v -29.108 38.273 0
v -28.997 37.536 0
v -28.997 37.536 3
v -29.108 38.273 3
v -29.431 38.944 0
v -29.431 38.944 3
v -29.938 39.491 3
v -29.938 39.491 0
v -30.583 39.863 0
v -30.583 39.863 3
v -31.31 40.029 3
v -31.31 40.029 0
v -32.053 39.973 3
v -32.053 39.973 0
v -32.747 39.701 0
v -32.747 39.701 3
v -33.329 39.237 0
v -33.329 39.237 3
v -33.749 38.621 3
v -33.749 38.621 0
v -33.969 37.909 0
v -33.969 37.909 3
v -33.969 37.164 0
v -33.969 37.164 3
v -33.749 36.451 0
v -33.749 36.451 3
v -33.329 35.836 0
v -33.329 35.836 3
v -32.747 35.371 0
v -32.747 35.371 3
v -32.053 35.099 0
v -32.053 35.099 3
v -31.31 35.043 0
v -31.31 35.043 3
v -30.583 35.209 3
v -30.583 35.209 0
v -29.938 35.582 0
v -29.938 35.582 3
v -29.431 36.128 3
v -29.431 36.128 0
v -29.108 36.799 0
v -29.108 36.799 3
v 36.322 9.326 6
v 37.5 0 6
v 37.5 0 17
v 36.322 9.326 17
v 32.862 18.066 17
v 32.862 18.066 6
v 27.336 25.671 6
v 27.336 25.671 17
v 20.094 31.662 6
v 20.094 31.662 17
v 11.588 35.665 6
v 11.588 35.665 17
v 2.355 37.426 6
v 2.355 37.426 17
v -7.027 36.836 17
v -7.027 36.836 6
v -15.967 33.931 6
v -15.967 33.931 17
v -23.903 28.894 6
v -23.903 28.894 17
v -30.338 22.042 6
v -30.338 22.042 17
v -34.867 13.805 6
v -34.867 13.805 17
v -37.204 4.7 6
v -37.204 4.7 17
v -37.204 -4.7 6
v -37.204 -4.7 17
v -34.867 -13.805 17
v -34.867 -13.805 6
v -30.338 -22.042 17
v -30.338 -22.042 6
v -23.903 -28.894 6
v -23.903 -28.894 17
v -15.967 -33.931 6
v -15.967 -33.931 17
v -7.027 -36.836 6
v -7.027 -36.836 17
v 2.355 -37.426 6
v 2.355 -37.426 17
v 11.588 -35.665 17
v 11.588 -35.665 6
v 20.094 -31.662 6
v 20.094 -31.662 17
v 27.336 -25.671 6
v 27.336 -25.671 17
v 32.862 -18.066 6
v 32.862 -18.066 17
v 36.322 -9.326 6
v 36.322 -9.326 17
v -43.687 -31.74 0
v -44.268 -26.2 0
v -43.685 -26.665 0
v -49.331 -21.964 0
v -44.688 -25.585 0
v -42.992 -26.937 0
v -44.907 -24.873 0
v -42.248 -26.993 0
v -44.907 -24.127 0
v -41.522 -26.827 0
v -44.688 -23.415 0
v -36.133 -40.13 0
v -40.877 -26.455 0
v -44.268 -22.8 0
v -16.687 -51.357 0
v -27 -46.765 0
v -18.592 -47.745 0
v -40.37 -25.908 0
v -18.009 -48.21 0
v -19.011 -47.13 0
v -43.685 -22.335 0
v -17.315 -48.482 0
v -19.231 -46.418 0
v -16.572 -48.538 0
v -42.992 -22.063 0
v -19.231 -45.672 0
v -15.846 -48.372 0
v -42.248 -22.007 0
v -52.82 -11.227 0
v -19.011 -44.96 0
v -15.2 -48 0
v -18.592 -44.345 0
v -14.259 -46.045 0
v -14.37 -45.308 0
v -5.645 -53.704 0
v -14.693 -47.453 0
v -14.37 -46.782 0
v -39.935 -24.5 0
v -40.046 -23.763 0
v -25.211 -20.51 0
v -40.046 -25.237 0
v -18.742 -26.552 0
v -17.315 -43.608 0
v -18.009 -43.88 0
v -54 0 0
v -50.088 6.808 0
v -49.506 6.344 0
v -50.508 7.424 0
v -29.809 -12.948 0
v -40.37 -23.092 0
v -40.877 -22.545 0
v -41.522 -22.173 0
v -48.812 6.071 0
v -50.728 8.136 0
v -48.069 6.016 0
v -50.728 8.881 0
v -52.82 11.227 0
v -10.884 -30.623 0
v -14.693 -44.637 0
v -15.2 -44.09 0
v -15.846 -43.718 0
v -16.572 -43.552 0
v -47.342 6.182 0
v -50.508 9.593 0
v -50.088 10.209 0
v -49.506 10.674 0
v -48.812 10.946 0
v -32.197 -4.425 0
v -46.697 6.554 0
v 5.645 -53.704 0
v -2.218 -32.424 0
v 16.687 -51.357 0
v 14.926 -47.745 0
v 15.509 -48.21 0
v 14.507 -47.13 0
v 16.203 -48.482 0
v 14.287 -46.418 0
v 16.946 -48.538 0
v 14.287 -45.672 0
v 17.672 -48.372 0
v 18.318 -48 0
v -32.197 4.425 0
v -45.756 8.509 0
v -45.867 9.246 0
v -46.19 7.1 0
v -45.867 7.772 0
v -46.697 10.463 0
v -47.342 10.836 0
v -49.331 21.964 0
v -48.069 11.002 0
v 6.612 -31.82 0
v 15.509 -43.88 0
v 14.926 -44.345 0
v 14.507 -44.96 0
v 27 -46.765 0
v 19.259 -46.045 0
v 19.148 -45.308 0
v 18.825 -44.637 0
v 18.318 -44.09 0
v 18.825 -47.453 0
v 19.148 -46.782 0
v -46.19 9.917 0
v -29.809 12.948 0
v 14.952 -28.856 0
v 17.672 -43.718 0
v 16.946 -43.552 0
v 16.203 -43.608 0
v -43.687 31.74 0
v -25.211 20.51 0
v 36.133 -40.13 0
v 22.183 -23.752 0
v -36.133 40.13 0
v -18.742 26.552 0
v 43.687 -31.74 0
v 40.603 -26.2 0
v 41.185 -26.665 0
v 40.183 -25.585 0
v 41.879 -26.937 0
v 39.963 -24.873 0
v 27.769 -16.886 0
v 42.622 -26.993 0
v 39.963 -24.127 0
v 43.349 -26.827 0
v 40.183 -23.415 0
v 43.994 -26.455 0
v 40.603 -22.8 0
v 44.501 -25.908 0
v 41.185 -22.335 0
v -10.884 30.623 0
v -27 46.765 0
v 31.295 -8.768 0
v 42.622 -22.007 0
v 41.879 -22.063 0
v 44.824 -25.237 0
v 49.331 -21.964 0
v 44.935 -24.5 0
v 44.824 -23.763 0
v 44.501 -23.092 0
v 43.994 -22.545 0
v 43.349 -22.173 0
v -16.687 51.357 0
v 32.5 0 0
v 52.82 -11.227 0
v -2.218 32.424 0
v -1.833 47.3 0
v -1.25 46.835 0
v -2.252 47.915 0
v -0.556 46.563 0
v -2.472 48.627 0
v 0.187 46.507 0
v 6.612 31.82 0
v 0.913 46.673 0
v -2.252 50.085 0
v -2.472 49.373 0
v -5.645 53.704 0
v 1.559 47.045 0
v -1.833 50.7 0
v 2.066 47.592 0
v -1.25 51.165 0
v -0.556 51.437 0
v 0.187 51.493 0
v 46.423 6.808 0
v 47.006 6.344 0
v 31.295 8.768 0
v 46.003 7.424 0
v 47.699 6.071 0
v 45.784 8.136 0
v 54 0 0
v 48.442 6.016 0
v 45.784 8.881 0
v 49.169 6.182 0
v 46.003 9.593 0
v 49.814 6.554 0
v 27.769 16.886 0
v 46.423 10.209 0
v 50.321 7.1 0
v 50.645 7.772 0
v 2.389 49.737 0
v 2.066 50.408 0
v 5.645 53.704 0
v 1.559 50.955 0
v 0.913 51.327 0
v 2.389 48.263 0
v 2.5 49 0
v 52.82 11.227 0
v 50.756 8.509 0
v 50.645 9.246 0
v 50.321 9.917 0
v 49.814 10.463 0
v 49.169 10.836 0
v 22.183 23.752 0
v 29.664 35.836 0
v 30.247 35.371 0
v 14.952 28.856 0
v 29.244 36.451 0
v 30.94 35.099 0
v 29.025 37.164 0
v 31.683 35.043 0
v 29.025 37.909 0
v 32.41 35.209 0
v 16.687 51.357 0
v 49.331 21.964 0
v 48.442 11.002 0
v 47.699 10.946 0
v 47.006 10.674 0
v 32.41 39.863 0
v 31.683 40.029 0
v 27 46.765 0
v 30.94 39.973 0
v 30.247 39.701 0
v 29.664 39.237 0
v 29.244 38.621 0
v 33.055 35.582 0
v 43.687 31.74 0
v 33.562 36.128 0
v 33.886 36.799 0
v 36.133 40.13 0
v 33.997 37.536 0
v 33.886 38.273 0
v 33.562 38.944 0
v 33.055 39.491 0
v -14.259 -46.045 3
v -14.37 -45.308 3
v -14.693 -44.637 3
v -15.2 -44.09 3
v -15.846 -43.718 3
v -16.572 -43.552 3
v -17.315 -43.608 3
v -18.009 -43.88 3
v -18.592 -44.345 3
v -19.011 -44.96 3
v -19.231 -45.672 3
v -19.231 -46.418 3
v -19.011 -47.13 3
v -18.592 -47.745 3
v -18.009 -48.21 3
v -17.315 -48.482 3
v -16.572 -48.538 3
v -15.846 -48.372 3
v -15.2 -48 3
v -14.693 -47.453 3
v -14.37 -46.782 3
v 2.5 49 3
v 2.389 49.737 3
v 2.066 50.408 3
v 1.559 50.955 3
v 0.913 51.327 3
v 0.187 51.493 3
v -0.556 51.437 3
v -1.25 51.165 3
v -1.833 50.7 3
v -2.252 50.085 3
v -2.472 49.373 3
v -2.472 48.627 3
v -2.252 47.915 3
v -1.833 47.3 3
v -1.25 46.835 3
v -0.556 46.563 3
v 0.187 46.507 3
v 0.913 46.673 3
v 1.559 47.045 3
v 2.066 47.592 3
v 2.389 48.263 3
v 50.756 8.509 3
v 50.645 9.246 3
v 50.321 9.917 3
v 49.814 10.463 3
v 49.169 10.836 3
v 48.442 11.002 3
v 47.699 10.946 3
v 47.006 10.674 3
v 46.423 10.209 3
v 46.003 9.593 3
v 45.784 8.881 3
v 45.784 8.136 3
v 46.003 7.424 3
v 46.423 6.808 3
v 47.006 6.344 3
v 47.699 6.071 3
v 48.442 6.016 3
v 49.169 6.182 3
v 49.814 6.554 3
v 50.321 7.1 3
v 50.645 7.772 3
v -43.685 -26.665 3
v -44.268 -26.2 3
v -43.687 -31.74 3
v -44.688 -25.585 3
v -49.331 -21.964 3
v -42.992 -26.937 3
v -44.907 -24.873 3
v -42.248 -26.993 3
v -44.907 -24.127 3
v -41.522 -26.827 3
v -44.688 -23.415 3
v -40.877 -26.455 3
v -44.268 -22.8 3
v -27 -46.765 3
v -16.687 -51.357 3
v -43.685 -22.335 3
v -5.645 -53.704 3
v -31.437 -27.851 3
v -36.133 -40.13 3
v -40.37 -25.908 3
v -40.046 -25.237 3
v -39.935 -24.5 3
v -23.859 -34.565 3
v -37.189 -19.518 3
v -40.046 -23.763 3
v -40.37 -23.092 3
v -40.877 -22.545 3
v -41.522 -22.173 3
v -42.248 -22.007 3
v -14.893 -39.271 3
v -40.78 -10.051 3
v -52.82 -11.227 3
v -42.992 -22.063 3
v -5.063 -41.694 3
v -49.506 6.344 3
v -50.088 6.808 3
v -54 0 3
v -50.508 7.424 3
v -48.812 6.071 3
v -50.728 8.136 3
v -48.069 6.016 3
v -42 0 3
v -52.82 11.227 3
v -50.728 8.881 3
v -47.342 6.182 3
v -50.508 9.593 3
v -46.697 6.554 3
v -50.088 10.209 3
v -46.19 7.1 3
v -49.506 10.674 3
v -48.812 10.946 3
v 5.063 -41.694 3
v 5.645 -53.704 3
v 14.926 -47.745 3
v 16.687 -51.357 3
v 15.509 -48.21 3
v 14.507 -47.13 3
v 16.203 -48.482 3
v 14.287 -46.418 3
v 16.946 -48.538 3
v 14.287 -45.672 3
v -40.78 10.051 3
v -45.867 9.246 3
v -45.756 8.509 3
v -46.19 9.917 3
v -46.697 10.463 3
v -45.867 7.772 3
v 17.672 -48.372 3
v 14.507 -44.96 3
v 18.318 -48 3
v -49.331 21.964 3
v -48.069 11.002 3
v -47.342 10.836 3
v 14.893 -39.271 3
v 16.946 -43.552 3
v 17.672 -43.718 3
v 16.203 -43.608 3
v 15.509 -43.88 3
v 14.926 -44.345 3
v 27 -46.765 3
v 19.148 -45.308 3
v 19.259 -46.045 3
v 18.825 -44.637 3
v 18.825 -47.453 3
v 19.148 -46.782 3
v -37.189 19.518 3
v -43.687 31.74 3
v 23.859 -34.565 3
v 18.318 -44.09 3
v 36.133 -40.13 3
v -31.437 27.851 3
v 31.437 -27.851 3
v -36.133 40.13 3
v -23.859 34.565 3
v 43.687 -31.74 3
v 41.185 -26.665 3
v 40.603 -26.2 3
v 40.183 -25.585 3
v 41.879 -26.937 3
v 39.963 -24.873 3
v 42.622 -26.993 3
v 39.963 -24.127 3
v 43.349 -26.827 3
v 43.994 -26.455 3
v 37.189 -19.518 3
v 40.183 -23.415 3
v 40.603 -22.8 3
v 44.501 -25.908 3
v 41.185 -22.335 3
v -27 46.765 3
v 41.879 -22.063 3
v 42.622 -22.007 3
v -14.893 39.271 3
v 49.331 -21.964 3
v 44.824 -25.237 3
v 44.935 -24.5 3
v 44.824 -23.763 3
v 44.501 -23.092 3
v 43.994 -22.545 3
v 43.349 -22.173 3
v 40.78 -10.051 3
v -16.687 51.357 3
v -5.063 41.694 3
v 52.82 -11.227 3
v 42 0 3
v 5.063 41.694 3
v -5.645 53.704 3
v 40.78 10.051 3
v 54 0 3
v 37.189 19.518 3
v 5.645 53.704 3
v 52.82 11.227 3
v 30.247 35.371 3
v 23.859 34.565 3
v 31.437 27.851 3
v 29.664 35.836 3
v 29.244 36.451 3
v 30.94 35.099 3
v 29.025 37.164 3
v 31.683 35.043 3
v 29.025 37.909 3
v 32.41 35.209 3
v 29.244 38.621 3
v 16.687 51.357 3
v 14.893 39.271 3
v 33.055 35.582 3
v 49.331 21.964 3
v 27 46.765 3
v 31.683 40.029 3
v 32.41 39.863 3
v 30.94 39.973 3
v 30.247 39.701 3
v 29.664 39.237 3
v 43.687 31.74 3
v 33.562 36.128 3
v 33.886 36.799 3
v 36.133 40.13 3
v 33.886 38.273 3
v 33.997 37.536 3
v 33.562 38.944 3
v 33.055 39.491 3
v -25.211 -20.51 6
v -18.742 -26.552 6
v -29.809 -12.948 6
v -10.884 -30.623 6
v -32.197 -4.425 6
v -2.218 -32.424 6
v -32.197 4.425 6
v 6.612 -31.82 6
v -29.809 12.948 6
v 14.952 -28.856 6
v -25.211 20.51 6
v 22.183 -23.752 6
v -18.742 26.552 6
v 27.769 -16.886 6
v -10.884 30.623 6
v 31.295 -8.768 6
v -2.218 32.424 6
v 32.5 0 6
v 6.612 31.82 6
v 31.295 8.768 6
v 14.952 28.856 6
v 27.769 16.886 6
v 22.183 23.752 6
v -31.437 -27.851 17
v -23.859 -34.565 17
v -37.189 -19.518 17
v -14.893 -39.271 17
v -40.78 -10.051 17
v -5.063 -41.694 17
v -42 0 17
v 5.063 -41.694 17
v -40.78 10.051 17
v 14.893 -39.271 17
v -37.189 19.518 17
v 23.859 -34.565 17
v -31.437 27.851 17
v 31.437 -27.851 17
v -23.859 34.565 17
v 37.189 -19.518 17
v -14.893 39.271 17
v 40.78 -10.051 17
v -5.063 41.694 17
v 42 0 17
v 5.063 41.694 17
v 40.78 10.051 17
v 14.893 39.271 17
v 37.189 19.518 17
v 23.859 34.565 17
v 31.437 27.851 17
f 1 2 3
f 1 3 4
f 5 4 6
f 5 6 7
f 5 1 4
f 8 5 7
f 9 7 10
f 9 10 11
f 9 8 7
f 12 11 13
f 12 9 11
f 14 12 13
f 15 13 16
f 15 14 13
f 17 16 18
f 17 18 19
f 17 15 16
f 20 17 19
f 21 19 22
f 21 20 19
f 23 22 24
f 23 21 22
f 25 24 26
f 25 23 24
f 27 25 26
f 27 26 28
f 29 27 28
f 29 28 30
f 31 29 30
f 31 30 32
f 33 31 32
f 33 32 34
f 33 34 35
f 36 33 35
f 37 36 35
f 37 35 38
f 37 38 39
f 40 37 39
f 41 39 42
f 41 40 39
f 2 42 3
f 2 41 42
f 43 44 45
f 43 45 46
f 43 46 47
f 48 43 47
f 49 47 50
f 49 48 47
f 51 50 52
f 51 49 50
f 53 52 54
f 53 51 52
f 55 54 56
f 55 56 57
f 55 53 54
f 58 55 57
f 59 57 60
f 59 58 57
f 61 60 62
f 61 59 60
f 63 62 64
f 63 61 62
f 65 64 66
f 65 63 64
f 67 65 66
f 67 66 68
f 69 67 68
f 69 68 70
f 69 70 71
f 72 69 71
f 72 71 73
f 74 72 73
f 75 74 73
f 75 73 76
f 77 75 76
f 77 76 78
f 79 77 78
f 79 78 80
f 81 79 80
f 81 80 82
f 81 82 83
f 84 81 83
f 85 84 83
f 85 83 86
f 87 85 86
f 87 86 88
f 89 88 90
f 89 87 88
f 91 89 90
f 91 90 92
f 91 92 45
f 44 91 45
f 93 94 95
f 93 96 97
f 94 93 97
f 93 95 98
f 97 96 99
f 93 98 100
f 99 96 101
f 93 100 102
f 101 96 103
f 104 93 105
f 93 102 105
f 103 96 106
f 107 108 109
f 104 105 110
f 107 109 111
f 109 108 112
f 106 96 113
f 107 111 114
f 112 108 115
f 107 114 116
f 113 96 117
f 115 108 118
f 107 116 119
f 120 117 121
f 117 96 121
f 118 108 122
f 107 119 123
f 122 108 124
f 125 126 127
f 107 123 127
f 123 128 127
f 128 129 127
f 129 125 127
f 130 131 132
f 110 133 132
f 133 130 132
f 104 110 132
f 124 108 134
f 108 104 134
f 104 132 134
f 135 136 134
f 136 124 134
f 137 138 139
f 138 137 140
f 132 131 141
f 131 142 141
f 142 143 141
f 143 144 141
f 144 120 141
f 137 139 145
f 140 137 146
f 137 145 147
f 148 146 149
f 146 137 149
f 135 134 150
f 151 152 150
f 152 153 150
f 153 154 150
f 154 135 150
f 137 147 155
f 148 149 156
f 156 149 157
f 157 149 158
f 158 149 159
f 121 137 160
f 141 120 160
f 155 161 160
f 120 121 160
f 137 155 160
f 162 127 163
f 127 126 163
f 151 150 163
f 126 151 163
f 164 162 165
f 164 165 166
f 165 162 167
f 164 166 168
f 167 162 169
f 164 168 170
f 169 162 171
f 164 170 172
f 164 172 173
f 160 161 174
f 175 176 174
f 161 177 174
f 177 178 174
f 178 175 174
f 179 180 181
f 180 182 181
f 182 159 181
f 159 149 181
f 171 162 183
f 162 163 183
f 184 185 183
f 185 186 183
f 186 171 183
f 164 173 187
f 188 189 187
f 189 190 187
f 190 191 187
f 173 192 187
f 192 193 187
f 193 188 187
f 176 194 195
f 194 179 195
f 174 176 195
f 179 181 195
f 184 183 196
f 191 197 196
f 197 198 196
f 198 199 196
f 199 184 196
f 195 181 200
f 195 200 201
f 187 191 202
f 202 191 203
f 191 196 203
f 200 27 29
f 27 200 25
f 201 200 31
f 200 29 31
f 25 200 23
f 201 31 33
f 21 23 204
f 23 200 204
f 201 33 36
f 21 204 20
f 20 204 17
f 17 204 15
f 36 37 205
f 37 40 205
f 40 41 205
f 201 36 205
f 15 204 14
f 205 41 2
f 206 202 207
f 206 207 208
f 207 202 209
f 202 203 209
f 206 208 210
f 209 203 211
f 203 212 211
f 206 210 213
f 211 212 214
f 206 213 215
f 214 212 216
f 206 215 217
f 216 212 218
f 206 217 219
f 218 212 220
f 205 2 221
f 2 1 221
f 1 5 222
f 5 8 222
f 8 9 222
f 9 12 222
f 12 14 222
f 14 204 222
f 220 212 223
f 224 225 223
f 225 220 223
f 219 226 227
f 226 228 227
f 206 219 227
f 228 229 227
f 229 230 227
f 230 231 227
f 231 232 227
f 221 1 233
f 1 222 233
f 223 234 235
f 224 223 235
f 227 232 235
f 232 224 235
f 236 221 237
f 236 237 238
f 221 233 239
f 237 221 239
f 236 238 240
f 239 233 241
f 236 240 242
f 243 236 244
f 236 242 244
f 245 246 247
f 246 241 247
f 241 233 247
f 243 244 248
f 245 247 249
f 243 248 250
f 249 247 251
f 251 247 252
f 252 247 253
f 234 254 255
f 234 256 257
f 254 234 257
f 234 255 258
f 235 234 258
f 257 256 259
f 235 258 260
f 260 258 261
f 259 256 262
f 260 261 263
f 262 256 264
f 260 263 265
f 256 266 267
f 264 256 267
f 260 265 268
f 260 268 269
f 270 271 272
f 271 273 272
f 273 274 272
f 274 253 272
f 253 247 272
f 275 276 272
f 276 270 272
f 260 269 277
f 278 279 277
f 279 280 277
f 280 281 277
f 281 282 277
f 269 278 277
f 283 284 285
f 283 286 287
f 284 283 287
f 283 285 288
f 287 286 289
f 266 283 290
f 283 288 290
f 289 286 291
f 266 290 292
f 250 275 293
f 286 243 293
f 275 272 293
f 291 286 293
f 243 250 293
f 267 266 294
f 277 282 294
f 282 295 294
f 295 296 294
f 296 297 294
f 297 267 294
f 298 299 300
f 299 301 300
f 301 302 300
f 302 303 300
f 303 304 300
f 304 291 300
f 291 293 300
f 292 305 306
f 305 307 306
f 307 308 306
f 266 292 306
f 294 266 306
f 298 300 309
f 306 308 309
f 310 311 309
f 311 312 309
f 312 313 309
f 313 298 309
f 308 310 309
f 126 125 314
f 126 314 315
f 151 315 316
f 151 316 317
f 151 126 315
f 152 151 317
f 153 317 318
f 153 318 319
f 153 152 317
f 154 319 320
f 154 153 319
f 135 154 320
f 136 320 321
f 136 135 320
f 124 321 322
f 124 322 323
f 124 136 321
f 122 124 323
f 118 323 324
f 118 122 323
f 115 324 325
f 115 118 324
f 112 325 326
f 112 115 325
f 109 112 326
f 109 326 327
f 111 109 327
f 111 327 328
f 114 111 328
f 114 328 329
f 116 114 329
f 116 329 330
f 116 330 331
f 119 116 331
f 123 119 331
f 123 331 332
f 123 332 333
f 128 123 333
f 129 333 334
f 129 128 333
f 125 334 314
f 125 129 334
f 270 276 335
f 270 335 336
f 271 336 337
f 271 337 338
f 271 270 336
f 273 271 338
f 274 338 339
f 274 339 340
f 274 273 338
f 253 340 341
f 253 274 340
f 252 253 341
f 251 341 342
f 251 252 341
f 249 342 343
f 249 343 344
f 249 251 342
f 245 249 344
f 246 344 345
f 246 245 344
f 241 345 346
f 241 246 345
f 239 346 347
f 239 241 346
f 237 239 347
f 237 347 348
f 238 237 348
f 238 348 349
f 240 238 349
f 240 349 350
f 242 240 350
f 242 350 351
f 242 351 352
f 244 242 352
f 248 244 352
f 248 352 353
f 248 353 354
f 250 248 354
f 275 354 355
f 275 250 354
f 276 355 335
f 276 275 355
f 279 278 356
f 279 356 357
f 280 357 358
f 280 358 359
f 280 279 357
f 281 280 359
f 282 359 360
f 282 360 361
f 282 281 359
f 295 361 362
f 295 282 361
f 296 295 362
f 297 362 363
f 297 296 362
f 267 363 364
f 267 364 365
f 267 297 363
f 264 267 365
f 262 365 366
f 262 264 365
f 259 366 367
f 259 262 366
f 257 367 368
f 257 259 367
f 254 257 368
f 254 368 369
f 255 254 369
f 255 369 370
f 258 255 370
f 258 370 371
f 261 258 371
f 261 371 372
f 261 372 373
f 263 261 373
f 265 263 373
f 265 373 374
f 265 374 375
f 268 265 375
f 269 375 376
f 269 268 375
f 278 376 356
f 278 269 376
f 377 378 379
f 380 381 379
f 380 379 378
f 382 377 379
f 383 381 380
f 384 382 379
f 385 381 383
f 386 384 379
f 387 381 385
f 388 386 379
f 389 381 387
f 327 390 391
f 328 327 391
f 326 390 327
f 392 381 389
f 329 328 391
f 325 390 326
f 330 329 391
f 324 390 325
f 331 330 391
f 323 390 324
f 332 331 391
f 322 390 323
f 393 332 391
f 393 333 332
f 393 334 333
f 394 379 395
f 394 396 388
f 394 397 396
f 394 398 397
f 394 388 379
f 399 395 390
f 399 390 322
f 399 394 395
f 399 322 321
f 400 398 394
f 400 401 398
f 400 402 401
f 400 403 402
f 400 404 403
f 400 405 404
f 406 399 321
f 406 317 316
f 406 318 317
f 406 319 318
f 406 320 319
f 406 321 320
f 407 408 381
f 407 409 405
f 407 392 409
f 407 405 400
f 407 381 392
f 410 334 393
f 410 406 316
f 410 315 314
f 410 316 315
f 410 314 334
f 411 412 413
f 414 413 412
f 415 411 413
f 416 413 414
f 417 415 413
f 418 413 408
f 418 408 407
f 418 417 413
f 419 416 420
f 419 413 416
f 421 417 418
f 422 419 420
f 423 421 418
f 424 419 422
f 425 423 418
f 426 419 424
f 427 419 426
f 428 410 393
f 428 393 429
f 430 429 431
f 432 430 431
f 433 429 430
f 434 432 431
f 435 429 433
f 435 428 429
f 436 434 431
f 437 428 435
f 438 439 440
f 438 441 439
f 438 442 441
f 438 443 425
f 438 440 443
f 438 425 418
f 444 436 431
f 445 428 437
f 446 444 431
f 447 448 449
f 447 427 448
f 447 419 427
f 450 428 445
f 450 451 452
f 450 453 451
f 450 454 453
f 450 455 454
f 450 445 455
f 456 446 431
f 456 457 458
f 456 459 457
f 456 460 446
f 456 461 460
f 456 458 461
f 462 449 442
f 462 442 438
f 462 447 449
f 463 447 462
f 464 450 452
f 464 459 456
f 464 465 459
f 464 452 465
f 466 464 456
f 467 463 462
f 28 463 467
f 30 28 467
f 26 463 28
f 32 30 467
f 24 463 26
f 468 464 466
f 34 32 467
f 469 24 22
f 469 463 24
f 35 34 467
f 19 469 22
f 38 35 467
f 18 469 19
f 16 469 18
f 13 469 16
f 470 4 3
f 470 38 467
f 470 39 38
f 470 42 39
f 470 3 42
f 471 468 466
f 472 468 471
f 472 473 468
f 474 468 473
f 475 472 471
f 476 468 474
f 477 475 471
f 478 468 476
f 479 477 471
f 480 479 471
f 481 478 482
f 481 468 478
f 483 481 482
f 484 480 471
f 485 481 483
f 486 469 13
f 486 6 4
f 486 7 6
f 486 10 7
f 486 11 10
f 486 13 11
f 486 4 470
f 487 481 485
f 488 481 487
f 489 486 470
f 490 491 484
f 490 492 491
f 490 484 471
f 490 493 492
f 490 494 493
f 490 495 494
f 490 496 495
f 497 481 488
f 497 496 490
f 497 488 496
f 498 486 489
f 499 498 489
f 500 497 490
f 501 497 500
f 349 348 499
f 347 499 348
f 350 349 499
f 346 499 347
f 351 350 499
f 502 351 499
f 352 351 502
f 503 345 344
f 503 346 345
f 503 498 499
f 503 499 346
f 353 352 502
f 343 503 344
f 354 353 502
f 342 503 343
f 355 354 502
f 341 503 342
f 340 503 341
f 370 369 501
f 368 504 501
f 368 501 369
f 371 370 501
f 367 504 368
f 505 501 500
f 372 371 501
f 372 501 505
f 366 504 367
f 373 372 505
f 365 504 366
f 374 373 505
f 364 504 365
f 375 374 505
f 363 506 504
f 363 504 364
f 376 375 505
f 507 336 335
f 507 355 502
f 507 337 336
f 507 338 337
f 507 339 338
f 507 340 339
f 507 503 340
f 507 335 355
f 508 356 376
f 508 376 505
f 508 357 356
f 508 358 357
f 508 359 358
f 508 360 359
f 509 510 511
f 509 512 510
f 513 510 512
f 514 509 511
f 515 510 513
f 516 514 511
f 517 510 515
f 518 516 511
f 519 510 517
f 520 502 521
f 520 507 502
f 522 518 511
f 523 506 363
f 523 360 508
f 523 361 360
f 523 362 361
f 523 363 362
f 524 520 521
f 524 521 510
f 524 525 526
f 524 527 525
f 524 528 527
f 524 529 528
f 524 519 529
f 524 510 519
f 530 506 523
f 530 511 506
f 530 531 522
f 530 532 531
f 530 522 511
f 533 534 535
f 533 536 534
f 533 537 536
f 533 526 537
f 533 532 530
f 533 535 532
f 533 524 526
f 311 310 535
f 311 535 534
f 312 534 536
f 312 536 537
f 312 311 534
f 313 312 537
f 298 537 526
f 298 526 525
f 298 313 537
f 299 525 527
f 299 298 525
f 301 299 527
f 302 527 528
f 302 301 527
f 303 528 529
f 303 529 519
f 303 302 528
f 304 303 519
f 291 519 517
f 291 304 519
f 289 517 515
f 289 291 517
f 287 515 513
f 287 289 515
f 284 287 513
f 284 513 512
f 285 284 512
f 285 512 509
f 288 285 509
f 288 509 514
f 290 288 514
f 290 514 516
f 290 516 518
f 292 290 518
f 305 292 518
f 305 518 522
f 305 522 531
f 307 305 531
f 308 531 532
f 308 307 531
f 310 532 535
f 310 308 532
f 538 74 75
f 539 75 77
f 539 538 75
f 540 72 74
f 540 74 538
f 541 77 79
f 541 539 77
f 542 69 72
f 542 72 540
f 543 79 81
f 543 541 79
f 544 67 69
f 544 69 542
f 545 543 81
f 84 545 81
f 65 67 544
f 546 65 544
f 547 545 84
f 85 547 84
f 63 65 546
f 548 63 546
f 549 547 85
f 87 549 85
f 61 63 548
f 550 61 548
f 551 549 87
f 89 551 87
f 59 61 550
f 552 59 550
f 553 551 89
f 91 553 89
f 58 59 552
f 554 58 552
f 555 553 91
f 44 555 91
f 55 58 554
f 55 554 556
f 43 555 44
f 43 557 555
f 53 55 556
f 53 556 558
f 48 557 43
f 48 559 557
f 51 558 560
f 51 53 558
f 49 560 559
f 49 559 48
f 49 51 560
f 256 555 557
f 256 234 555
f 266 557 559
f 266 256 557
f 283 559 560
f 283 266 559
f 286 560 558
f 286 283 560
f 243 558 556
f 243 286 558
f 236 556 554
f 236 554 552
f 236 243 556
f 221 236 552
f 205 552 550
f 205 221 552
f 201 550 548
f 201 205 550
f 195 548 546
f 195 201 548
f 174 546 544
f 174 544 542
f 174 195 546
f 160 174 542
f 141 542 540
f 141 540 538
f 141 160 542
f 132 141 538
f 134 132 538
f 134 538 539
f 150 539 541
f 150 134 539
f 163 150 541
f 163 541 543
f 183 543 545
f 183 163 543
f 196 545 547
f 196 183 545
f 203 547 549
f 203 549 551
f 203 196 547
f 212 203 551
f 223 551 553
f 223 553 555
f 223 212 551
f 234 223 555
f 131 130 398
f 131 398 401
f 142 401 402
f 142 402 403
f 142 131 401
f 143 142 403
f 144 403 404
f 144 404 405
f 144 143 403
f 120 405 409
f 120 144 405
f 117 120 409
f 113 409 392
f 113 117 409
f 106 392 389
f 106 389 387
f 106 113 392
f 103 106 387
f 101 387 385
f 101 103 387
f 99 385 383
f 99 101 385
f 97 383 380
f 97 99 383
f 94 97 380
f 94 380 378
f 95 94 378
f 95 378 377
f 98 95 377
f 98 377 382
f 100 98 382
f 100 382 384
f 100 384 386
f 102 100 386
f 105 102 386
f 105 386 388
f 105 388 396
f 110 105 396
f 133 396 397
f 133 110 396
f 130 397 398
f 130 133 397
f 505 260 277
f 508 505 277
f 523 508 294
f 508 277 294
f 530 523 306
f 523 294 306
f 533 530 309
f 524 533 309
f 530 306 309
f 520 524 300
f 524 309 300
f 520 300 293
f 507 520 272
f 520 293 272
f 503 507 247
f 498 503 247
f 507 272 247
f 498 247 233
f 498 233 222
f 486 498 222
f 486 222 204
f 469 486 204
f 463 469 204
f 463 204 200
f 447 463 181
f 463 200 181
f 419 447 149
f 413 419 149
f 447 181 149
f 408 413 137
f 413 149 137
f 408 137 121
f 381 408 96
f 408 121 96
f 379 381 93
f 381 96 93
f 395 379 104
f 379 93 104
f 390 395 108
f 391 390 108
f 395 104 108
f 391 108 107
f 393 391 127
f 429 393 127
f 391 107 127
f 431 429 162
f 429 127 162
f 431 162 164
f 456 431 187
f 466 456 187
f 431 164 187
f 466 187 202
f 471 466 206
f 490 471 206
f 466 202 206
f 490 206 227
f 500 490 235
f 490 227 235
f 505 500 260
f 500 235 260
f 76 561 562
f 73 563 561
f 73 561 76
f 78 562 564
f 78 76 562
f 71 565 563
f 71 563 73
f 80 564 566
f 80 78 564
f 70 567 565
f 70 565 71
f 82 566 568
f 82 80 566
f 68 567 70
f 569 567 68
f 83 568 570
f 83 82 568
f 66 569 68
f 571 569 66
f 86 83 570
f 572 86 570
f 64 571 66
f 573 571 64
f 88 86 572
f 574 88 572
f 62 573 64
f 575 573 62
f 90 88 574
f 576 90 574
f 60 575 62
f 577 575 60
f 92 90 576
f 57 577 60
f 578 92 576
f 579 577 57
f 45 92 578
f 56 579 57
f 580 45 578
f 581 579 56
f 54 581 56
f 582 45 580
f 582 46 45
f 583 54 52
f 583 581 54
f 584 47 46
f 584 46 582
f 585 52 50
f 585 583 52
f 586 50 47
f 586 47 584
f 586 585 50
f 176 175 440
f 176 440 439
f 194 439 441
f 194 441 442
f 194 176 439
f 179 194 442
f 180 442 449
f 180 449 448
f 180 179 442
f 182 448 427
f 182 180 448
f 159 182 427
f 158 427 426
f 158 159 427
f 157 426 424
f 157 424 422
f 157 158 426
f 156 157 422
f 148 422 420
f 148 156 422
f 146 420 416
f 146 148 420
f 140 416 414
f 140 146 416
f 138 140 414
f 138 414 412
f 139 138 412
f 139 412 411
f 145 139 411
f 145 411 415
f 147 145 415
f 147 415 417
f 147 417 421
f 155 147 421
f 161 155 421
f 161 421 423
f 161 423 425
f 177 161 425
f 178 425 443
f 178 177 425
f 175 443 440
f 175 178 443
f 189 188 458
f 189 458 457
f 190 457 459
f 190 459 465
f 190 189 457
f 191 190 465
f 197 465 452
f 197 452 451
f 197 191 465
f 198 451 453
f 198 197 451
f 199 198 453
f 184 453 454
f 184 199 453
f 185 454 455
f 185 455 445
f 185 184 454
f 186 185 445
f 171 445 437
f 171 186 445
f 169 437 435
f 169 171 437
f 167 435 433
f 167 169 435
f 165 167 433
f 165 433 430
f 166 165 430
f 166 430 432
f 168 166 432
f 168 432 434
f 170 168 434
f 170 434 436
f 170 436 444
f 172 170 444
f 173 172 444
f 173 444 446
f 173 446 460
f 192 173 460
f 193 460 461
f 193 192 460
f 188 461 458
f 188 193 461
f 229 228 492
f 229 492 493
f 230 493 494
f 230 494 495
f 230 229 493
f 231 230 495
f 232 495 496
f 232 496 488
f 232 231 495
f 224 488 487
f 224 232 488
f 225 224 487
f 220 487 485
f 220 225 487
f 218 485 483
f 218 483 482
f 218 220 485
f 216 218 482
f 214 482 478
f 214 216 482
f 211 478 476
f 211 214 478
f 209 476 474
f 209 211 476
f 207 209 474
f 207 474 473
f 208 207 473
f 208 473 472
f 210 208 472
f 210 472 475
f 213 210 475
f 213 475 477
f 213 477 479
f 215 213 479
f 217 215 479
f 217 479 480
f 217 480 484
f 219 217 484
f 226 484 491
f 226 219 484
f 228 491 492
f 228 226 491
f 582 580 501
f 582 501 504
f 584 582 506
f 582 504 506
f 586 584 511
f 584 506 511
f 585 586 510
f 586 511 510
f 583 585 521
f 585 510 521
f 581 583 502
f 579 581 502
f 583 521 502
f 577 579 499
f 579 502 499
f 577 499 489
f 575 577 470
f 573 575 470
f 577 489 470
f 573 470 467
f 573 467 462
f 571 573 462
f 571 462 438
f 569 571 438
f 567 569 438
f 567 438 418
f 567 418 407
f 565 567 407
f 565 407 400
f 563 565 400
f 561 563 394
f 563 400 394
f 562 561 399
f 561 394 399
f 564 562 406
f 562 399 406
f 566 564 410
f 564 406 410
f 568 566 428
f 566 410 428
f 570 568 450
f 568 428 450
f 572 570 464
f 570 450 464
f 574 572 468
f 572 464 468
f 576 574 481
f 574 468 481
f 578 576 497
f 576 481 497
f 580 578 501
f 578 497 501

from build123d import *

# Parameters (mm, degrees)
SKETCH_R      = 54
SKETCH_R_2    = 32.5
SKETCH_R_3    = 2.5
PAD_DEPTH     = 3
SKETCH002_R   = 42
SKETCH002_R_2 = 37.5
PAD002_DEPTH  = 14
SKETCH003_R   = 37.5
SKETCH003_R_2 = 32.5
PAD003_DEPTH  = 3


with BuildPart() as part:
    # Sketch → Pad (new body)
    with BuildSketch(Plane.XY):
        Circle(SKETCH_R)
        Circle(SKETCH_R_2, mode=Mode.SUBTRACT)
        with Locations((0, 49)):
            Circle(SKETCH_R_3, mode=Mode.SUBTRACT)
        with Locations((48.25558, 8.508761)):
            Circle(SKETCH_R_3, mode=Mode.SUBTRACT)
        with Locations((42.435245, -24.5)):
            Circle(SKETCH_R_3, mode=Mode.SUBTRACT)
        with Locations((16.758987, -46.044938)):
            Circle(SKETCH_R_3, mode=Mode.SUBTRACT)
        with Locations((-16.758987, -46.044938)):
            Circle(SKETCH_R_3, mode=Mode.SUBTRACT)
        with Locations((-42.435245, -24.5)):
            Circle(SKETCH_R_3, mode=Mode.SUBTRACT)
        with Locations((-48.25558, 8.508761)):
            Circle(SKETCH_R_3, mode=Mode.SUBTRACT)
        with Locations((-31.496593, 37.536178)):
            Circle(SKETCH_R_3, mode=Mode.SUBTRACT)
        with Locations((31.496593, 37.536178)):
            Circle(SKETCH_R_3, mode=Mode.SUBTRACT)
    extrude(amount=PAD_DEPTH)

    # Sketch002 → Pad002 (join)
    with BuildSketch(Plane.XY.offset(3)):
        Circle(SKETCH002_R)
        Circle(SKETCH002_R_2, mode=Mode.SUBTRACT)
    extrude(amount=PAD002_DEPTH)

    # Sketch003 (on Face15 of Pad002) → Pad003 (join)
    with BuildSketch(Plane.XY.offset(3)):
        Circle(SKETCH003_R)
        Circle(SKETCH003_R_2, mode=Mode.SUBTRACT)
    extrude(amount=PAD003_DEPTH)


solid = part.part
